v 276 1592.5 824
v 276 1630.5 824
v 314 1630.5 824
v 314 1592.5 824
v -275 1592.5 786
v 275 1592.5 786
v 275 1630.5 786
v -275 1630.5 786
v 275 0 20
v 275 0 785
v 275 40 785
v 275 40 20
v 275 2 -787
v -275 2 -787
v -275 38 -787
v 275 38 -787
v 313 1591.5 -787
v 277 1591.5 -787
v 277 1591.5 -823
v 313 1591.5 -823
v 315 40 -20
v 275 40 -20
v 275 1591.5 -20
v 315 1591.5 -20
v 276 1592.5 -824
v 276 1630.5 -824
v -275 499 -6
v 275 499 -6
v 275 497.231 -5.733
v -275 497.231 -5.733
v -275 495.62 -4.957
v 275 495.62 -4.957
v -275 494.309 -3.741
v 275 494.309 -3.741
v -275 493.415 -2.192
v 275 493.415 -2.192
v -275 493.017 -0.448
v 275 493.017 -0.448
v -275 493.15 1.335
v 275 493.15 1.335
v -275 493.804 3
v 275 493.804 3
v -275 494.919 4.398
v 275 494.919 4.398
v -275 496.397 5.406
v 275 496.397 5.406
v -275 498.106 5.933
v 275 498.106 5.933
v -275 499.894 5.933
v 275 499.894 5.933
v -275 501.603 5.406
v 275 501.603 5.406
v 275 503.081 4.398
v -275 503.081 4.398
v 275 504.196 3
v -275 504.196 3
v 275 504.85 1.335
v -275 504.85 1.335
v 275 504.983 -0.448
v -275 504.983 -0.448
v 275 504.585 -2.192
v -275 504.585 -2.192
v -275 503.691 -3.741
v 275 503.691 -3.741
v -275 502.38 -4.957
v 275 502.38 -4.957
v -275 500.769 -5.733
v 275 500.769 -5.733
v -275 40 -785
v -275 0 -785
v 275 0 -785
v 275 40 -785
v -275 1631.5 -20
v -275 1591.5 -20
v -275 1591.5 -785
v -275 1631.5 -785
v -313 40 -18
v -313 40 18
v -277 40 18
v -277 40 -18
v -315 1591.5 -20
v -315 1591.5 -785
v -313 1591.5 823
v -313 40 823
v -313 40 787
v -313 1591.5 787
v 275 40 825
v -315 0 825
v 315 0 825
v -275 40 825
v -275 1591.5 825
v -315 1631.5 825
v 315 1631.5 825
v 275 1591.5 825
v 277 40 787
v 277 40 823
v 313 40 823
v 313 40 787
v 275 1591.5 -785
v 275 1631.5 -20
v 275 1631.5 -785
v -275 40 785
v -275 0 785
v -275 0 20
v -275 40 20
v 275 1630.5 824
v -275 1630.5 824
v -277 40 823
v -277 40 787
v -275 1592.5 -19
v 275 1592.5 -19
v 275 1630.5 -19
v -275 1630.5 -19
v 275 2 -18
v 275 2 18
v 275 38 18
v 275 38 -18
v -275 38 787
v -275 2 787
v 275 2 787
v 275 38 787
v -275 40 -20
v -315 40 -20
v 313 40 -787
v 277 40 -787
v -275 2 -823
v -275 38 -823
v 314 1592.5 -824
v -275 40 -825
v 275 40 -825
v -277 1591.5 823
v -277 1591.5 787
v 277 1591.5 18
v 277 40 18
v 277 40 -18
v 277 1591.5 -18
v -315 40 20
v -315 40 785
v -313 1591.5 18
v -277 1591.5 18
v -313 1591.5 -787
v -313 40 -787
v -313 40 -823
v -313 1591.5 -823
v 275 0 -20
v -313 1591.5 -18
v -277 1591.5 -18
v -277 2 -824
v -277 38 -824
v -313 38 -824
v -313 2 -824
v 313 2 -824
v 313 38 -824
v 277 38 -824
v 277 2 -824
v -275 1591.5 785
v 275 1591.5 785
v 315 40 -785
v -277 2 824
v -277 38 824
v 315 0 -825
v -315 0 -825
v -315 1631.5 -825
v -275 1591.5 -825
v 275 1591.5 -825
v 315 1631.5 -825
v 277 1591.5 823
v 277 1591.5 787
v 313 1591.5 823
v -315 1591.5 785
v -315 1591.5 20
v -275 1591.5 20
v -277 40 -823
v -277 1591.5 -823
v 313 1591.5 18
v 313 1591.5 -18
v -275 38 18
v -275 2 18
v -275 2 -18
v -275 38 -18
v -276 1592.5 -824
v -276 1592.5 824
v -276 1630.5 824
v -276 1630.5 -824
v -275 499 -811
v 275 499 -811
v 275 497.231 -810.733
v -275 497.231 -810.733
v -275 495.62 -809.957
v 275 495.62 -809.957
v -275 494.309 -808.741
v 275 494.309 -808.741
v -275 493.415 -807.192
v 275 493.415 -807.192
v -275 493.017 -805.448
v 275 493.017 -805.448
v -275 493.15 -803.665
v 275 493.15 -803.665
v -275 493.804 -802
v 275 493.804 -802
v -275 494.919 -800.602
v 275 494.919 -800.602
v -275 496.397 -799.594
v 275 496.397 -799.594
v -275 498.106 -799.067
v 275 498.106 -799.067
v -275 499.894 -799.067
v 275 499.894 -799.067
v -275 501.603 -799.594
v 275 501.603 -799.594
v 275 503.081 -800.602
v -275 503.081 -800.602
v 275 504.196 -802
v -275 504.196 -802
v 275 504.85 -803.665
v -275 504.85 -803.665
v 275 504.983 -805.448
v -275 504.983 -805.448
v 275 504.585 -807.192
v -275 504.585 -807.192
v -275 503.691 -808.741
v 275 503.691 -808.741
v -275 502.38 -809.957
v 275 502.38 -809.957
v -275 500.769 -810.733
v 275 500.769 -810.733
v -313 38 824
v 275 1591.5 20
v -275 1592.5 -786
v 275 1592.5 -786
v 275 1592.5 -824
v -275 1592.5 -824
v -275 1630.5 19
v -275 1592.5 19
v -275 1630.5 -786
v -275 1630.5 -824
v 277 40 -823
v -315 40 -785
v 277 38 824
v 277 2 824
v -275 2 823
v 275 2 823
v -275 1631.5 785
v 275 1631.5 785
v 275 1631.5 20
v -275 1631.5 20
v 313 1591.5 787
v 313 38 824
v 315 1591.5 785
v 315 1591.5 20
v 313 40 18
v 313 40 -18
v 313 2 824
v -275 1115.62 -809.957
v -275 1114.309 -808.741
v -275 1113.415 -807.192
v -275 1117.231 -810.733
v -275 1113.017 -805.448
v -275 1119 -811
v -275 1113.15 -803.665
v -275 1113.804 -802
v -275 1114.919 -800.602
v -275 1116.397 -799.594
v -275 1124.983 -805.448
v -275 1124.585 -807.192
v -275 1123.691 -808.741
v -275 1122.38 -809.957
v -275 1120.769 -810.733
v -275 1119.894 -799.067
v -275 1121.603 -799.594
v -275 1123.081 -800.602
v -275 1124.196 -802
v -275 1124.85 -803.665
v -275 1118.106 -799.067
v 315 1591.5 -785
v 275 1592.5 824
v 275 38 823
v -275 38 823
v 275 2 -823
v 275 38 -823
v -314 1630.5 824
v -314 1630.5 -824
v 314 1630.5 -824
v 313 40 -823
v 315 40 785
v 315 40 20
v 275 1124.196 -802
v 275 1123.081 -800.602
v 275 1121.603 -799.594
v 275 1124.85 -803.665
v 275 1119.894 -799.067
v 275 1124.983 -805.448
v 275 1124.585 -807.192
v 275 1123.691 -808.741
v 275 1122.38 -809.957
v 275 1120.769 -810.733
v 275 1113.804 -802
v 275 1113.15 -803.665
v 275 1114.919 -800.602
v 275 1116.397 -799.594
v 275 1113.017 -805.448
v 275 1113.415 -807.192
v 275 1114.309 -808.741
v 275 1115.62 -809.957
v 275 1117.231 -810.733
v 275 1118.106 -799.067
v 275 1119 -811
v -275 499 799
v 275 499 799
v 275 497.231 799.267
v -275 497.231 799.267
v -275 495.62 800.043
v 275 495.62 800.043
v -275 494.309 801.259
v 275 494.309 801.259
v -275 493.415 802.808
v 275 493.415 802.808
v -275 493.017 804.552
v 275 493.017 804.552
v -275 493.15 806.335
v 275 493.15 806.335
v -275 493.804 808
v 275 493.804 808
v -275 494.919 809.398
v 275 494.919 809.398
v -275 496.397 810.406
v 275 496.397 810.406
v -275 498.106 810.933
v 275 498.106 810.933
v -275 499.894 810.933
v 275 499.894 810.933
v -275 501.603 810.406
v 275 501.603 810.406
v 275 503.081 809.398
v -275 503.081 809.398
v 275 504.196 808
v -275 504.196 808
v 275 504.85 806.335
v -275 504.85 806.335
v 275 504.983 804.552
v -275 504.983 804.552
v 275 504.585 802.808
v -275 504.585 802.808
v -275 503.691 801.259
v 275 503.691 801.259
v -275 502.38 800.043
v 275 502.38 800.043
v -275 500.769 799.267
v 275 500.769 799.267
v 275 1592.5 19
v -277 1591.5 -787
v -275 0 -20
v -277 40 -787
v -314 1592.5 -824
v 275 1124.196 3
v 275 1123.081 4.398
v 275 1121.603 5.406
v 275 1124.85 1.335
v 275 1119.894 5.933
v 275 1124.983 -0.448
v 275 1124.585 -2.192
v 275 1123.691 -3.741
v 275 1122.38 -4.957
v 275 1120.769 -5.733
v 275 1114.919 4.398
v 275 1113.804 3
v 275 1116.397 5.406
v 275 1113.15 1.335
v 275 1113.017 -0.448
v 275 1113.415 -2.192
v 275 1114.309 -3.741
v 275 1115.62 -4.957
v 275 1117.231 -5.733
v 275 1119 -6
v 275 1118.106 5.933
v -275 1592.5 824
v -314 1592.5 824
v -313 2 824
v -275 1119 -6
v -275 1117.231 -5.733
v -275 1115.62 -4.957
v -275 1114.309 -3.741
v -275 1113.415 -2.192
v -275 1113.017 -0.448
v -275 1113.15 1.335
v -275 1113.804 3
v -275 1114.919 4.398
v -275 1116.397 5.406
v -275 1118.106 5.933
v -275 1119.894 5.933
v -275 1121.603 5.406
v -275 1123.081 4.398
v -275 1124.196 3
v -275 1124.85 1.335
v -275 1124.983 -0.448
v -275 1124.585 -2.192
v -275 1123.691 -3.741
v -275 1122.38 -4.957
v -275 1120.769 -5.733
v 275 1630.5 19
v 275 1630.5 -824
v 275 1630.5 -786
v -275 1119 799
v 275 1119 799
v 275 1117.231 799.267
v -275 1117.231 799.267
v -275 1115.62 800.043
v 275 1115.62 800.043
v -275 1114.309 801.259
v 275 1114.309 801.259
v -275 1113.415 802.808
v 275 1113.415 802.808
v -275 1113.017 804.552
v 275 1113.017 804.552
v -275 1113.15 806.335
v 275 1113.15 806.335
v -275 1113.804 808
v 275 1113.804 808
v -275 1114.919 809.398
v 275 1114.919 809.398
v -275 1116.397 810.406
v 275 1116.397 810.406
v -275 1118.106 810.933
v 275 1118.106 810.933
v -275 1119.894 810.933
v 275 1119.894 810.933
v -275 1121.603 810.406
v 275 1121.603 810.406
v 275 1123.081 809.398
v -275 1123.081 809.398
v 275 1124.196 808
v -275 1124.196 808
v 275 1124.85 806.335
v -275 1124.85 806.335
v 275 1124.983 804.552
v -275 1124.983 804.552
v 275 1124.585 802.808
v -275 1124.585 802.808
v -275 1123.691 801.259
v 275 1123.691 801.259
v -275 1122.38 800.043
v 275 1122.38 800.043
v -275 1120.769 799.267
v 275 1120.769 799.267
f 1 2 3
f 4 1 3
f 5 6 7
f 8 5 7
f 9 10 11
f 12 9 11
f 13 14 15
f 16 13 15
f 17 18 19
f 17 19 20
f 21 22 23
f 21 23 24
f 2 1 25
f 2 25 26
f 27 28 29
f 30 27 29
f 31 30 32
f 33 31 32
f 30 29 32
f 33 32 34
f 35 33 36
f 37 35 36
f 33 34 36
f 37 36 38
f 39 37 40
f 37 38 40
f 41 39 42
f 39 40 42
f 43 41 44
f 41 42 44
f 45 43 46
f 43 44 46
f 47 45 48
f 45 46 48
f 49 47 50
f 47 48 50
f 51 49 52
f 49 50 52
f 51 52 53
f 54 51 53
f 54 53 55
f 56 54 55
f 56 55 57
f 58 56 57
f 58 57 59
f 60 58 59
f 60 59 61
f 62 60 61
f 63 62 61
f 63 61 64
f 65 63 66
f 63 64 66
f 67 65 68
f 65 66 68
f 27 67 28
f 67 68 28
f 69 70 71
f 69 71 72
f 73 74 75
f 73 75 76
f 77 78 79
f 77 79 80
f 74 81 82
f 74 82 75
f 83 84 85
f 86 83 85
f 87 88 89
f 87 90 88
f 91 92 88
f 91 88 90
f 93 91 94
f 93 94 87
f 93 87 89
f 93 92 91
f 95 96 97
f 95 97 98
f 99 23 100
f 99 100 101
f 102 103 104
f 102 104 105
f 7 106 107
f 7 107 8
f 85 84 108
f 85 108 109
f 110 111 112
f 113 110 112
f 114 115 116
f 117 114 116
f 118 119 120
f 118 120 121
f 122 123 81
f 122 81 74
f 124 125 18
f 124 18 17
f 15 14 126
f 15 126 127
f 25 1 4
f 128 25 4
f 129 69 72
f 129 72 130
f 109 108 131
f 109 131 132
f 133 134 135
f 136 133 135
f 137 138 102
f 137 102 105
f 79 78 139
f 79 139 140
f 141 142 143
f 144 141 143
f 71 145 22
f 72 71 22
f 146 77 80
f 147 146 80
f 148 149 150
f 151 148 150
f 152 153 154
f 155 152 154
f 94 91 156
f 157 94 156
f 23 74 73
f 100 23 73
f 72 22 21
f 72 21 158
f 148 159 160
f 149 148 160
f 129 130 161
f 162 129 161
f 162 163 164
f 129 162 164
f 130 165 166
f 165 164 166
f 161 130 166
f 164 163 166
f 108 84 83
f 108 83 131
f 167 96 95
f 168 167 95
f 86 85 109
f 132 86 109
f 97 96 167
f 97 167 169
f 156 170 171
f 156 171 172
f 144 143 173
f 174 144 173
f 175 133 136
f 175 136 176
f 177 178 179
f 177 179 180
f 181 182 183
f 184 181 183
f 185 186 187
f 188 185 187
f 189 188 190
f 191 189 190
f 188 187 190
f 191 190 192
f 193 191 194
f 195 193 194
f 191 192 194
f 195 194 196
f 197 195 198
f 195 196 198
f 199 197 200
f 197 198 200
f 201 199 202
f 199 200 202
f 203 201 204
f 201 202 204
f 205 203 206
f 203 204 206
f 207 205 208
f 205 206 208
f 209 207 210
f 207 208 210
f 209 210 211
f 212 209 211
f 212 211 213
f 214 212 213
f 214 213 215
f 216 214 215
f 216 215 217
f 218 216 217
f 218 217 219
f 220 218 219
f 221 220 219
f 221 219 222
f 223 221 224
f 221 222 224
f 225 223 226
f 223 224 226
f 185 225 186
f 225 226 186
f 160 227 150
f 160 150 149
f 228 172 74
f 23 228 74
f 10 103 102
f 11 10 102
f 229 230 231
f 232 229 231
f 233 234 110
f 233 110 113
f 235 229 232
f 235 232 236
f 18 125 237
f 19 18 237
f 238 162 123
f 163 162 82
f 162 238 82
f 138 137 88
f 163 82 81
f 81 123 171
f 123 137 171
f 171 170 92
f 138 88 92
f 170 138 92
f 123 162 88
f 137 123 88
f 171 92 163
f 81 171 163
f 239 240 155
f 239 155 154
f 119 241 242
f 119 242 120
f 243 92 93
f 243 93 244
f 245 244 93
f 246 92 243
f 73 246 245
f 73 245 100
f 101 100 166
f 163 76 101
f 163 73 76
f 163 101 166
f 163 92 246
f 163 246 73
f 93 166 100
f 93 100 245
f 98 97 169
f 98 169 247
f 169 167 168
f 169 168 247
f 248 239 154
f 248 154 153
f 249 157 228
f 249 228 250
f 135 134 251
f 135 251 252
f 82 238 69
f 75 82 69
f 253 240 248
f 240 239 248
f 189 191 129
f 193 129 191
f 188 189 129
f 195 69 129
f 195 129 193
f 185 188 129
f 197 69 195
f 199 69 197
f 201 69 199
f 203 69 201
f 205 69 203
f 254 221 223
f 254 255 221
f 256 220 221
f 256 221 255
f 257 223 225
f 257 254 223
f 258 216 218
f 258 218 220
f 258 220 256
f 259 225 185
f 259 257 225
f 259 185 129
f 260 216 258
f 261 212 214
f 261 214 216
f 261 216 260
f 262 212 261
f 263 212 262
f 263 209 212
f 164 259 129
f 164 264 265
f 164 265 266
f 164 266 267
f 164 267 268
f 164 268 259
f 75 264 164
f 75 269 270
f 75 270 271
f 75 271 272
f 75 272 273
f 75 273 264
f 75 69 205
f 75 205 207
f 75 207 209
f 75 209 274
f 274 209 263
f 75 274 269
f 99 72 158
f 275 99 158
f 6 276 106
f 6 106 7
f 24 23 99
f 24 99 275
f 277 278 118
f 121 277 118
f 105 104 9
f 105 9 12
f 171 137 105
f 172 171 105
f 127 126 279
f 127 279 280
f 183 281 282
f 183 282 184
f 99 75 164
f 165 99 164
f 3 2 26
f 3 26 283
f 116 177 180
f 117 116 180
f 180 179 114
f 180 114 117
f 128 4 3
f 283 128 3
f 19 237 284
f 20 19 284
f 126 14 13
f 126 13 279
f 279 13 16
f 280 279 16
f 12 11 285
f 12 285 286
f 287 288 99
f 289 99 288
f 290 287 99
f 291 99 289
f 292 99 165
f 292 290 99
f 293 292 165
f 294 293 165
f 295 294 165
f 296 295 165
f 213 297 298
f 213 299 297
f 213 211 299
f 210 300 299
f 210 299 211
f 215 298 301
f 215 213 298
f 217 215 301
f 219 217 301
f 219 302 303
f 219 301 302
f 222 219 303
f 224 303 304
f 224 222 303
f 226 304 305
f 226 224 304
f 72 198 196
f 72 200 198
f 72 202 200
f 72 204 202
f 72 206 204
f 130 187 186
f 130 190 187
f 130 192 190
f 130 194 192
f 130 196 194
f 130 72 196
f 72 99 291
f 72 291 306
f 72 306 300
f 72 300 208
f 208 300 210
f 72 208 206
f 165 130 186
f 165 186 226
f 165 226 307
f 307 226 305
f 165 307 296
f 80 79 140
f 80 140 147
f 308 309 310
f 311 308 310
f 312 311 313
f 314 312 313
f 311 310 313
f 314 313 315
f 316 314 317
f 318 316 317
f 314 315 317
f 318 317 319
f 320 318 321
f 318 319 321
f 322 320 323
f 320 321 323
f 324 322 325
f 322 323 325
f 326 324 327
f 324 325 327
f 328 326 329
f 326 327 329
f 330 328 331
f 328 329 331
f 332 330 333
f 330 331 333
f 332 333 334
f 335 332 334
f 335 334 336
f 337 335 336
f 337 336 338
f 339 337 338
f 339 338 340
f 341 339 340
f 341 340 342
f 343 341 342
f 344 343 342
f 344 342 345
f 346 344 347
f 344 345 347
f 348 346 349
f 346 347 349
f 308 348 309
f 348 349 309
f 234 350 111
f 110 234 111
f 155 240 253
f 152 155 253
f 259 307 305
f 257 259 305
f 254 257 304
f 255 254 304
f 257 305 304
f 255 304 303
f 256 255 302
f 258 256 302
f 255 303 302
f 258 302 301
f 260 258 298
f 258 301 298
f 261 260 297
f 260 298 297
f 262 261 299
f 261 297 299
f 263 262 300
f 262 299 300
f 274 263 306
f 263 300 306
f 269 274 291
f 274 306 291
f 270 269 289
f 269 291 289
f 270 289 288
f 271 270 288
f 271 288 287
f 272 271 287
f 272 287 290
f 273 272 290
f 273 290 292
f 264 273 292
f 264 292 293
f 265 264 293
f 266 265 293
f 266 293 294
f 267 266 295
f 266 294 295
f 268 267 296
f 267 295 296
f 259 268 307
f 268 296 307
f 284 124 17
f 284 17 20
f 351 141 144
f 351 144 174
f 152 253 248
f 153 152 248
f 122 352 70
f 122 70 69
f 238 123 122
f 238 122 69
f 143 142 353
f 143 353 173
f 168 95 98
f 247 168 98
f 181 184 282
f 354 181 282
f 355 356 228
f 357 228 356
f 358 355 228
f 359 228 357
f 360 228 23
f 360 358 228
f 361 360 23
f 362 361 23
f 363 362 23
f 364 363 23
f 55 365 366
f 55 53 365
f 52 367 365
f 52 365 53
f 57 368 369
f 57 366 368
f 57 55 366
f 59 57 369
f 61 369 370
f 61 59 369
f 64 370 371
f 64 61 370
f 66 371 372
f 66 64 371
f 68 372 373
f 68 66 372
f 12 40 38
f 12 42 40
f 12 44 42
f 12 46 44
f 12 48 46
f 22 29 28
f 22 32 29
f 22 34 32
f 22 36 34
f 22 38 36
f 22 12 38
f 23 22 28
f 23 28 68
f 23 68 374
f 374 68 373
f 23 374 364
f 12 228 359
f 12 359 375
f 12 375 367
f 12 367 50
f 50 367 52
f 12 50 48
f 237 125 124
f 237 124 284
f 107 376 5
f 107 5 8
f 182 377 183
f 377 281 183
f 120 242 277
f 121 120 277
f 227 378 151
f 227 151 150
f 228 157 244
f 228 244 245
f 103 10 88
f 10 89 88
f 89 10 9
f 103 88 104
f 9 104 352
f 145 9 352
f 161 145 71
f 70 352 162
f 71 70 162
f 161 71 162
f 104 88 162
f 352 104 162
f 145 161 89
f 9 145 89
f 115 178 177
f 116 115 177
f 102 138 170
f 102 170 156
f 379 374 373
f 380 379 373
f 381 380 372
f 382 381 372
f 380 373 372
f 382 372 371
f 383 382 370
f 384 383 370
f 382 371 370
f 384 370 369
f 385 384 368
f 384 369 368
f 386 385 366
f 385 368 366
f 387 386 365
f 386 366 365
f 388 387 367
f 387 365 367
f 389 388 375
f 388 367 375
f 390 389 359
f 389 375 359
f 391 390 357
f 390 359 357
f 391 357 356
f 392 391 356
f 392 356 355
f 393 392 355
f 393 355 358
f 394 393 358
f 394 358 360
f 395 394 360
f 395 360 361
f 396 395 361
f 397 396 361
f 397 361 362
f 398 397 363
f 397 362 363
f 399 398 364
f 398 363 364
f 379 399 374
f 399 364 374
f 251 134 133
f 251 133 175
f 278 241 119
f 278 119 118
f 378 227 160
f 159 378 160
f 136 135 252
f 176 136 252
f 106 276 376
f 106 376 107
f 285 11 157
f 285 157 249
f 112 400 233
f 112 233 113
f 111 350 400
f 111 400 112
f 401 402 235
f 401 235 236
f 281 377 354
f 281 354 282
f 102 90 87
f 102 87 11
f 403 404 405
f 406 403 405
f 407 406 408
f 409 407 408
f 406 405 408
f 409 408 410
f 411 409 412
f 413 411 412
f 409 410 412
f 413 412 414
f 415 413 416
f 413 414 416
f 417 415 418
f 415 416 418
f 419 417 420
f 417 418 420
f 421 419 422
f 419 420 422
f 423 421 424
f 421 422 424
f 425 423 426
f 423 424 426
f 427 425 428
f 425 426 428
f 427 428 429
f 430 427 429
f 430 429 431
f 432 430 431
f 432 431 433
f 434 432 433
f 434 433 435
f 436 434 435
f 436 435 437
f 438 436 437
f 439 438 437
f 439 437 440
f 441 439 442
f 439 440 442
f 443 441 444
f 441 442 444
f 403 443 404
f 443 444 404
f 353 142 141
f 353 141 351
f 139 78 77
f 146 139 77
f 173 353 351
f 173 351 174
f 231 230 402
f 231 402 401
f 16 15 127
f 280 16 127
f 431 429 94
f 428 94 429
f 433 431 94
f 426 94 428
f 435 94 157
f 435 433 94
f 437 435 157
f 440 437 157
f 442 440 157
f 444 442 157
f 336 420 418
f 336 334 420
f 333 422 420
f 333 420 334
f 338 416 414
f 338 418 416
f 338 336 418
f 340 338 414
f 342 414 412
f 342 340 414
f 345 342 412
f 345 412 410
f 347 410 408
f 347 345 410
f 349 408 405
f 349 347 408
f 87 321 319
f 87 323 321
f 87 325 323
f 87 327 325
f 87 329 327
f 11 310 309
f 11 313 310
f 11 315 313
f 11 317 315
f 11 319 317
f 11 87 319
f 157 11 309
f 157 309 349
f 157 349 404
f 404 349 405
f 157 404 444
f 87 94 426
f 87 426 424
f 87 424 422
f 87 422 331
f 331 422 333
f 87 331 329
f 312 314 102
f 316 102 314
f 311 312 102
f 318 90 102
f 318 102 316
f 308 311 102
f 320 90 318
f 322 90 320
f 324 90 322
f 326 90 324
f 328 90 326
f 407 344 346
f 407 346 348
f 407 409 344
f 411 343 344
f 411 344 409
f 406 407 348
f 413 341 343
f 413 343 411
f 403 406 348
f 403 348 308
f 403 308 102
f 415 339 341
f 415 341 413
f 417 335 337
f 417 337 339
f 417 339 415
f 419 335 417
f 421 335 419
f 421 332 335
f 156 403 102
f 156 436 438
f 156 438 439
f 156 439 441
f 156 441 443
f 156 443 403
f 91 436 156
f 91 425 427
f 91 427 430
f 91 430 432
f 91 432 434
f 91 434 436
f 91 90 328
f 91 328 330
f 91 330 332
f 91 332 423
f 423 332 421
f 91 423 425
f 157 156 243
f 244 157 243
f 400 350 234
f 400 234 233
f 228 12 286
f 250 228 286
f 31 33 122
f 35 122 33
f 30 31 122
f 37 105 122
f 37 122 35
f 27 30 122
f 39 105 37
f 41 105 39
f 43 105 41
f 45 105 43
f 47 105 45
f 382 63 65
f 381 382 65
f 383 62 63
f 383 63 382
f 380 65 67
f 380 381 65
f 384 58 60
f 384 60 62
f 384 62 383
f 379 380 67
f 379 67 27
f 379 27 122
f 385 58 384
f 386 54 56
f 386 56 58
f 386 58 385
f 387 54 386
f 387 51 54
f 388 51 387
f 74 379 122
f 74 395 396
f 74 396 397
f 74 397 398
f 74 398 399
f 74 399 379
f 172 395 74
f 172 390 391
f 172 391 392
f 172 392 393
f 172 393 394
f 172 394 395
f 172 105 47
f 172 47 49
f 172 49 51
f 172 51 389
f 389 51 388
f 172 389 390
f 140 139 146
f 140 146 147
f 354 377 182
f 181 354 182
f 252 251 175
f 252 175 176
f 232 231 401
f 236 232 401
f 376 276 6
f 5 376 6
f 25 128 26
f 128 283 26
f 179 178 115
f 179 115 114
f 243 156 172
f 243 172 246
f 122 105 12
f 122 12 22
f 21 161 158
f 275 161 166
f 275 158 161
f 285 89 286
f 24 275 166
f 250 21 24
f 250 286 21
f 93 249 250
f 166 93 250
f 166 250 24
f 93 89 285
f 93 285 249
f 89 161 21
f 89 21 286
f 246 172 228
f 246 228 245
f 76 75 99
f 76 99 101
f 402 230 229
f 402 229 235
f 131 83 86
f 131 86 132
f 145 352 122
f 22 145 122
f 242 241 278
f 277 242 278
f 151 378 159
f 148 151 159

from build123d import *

# Parameters (mm, degrees)
SKETCH1_W             = 40
SKETCH1_H             = 40
SKETCH1_W_2           = 36
SKETCH1_H_2           = 36
BOSS_EXTRUDE1_DEPTH   = 825
BOSS_EXTRUDE1_2_DEPTH = 825
SKETCH2_W             = 40
SKETCH2_H             = 40
SKETCH2_W_2           = 36
SKETCH2_H_2           = 36
BOSS_EXTRUDE2_DEPTH   = 550
SKETCH3_W             = 40
SKETCH3_H             = 40
SKETCH3_W_2           = 36
SKETCH3_H_2           = 36
BOSS_EXTRUDE5_DEPTH   = 1551.5
SKETCH5_W             = 40
SKETCH5_H             = 40
SKETCH5_W_2           = 38
SKETCH5_H_2           = 38
BOSS_EXTRUDE6_DEPTH   = 1650
SKETCH6_W             = 40
SKETCH6_H             = 40
SKETCH6_W_2           = 38
SKETCH6_H_2           = 38
BOSS_EXTRUDE7_DEPTH   = 550
SKETCH7_R             = 6
BOSS_EXTRUDE8_DEPTH   = 550
SKETCH8_W             = 40
SKETCH8_H             = 40
BOSS_EXTRUDE10_DEPTH  = 1
SKETCH9_W             = 40
SKETCH9_H             = 40
BOSS_EXTRUDE11_DEPTH  = 1


with BuildPart() as part:
    # Sketch1 → Boss-Extrude1 (new, symmetric)
    with BuildSketch(Plane.XY):
        with Locations((-295, 20)):
            Rectangle(SKETCH1_W, SKETCH1_H)
        with Locations((-295, 20)):
            Rectangle(SKETCH1_W_2, SKETCH1_H_2, mode=Mode.SUBTRACT)
    extrude(amount=BOSS_EXTRUDE1_DEPTH, both=True)



with BuildPart() as body_2:
    # Sketch1 → Boss-Extrude1 2 (new, symmetric)
    with BuildSketch(Plane.XY):
        with Locations((295, 20)):
            Rectangle(SKETCH1_W, SKETCH1_H)
        with Locations((295, 20)):
            Rectangle(SKETCH1_W_2, SKETCH1_H_2, mode=Mode.SUBTRACT)
    extrude(amount=BOSS_EXTRUDE1_2_DEPTH, both=True)


with BuildPart() as part_1:
    add(part.part)

    add(body_2.part)  # Boss-Extrude2 merges body 2
    # Sketch2 → Boss-Extrude2 (add)
    # profile 1 of 3: a face of its own
    with BuildSketch(Plane(origin=(-275, 0, 0), x_dir=(0, 0, -1), z_dir=(1, 0, 0))):
        with Locations((-805, 20)):
            Rectangle(SKETCH2_W, SKETCH2_H)
        with Locations((-805, 20)):
            Rectangle(SKETCH2_W_2, SKETCH2_H_2, mode=Mode.SUBTRACT)
    # profile 2 of 3: a face of its own
    with BuildSketch(Plane(origin=(-275, 0, 0), x_dir=(0, 0, -1), z_dir=(1, 0, 0))):
        with Locations((805, 20)):
            Rectangle(SKETCH2_W, SKETCH2_H)
        with Locations((805, 20)):
            Rectangle(SKETCH2_W_2, SKETCH2_H_2, mode=Mode.SUBTRACT)
    # profile 3 of 3: a face of its own
    with BuildSketch(Plane(origin=(-275, 0, 0), x_dir=(0, 0, -1), z_dir=(1, 0, 0))):
        with Locations((0, 20)):
            Rectangle(SKETCH2_W, SKETCH2_H)
        with Locations((0, 20)):
            Rectangle(SKETCH2_W_2, SKETCH2_H_2, mode=Mode.SUBTRACT)
    extrude(amount=BOSS_EXTRUDE2_DEPTH)

    # Sketch3 → Boss-Extrude5 (add)
    # profile 1 of 6: a face of its own
    with BuildSketch(Plane(origin=(0, 40, 0), x_dir=(1, 0, 0), z_dir=(0, 1, 0))):
        with Locations((-295, -805)):
            Rectangle(SKETCH3_W, SKETCH3_H)
        with Locations((-295, -805)):
            Rectangle(SKETCH3_W_2, SKETCH3_H_2, mode=Mode.SUBTRACT)
    # profile 2 of 6: a face of its own
    with BuildSketch(Plane(origin=(0, 40, 0), x_dir=(1, 0, 0), z_dir=(0, 1, 0))):
        with Locations((295, -805)):
            Rectangle(SKETCH3_W, SKETCH3_H)
        with Locations((295, -805)):
            Rectangle(SKETCH3_W_2, SKETCH3_H_2, mode=Mode.SUBTRACT)
    # profile 3 of 6: a face of its own
    with BuildSketch(Plane(origin=(0, 40, 0), x_dir=(1, 0, 0), z_dir=(0, 1, 0))):
        with Locations((295, 0)):
            Rectangle(SKETCH3_W, SKETCH3_H)
        with Locations((295, 0)):
            Rectangle(SKETCH3_W_2, SKETCH3_H_2, mode=Mode.SUBTRACT)
    # profile 4 of 6: a face of its own
    with BuildSketch(Plane(origin=(0, 40, 0), x_dir=(1, 0, 0), z_dir=(0, 1, 0))):
        with Locations((-295, 0)):
            Rectangle(SKETCH3_W, SKETCH3_H)
        with Locations((-295, 0)):
            Rectangle(SKETCH3_W_2, SKETCH3_H_2, mode=Mode.SUBTRACT)
    # profile 5 of 6: a face of its own
    with BuildSketch(Plane(origin=(0, 40, 0), x_dir=(1, 0, 0), z_dir=(0, 1, 0))):
        with Locations((-295, 805)):
            Rectangle(SKETCH3_W, SKETCH3_H)
        with Locations((-295, 805)):
            Rectangle(SKETCH3_W_2, SKETCH3_H_2, mode=Mode.SUBTRACT)
    # profile 6 of 6: a face of its own
    with BuildSketch(Plane(origin=(0, 40, 0), x_dir=(1, 0, 0), z_dir=(0, 1, 0))):
        with Locations((295, 805)):
            Rectangle(SKETCH3_W, SKETCH3_H)
        with Locations((295, 805)):
            Rectangle(SKETCH3_W_2, SKETCH3_H_2, mode=Mode.SUBTRACT)
    extrude(amount=BOSS_EXTRUDE5_DEPTH)

    # Sketch5 → Boss-Extrude6 (add)
    # profile 1 of 2: a face of its own
    with BuildSketch(Plane.XY.offset(825)):
        with Locations((-295, 1611.5)):
            Rectangle(SKETCH5_W, SKETCH5_H)
        with Locations((-295, 1611.5)):
            Rectangle(SKETCH5_W_2, SKETCH5_H_2, mode=Mode.SUBTRACT)
    # profile 2 of 2: a face of its own
    with BuildSketch(Plane.XY.offset(825)):
        with Locations((295, 1611.5)):
            Rectangle(SKETCH5_W, SKETCH5_H)
        with Locations((295, 1611.5)):
            Rectangle(SKETCH5_W_2, SKETCH5_H_2, mode=Mode.SUBTRACT)
    extrude(amount=-BOSS_EXTRUDE6_DEPTH)

    # Sketch6 → Boss-Extrude7 (add)
    # profile 1 of 3: a face of its own
    with BuildSketch(Plane(origin=(-275, 0, 0), x_dir=(0, 0, -1), z_dir=(1, 0, 0))):
        with Locations((0, 1611.5)):
            Rectangle(SKETCH6_W, SKETCH6_H)
        with Locations((0, 1611.5)):
            Rectangle(SKETCH6_W_2, SKETCH6_H_2, mode=Mode.SUBTRACT)
    # profile 2 of 3: a face of its own
    with BuildSketch(Plane(origin=(-275, 0, 0), x_dir=(0, 0, -1), z_dir=(1, 0, 0))):
        with Locations((-805, 1611.5)):
            Rectangle(SKETCH6_W, SKETCH6_H)
        with Locations((-805, 1611.5)):
            Rectangle(SKETCH6_W_2, SKETCH6_H_2, mode=Mode.SUBTRACT)
    # profile 3 of 3: a face of its own
    with BuildSketch(Plane(origin=(-275, 0, 0), x_dir=(0, 0, -1), z_dir=(1, 0, 0))):
        with Locations((805, 1611.5)):
            Rectangle(SKETCH6_W, SKETCH6_H)
        with Locations((805, 1611.5)):
            Rectangle(SKETCH6_W_2, SKETCH6_H_2, mode=Mode.SUBTRACT)
    extrude(amount=BOSS_EXTRUDE7_DEPTH)

    # Sketch7 → Boss-Extrude8 (add)
    with BuildSketch(Plane.ZY.offset(-275)):
        with Locations(Location((805, 1119, 0), (0, 0, 180))):
            Circle(SKETCH7_R)
        with Locations(Location((805, 499, 0), (0, 0, 180))):
            Circle(SKETCH7_R)
        with Locations(Location((0, 1119, 0), (0, 0, 180))):
            Circle(SKETCH7_R)
        with Locations(Location((0, 499, 0), (0, 0, 180))):
            Circle(SKETCH7_R)
        with Locations(Location((-805, 499, 0), (0, 0, 180))):
            Circle(SKETCH7_R)
        with Locations(Location((-805, 1119, 0), (0, 0, 180))):
            Circle(SKETCH7_R)
    extrude(amount=BOSS_EXTRUDE8_DEPTH)

    # Sketch8 → Boss-Extrude10 (add)
    with BuildSketch(Plane.XY.offset(825)):
        with Locations((-295, 1611.5)):
            Rectangle(SKETCH8_W, SKETCH8_H)
        with Locations((295, 1611.5)):
            Rectangle(SKETCH8_W, SKETCH8_H)
        with Locations((-295, 20)):
            Rectangle(SKETCH8_W, SKETCH8_H)
        with Locations((295, 20)):
            Rectangle(SKETCH8_W, SKETCH8_H)
    extrude(amount=-BOSS_EXTRUDE10_DEPTH)

    # Sketch9 → Boss-Extrude11 (add)
    with BuildSketch(Plane(origin=(0, 0, -825), x_dir=(-1, 0, 0), z_dir=(0, 0, -1))):
        with Locations((-295, 1611.5)):
            Rectangle(SKETCH9_W, SKETCH9_H)
        with Locations((295, 1611.5)):
            Rectangle(SKETCH9_W, SKETCH9_H)
        with Locations((295, 20)):
            Rectangle(SKETCH9_W, SKETCH9_H)
        with Locations((-295, 20)):
            Rectangle(SKETCH9_W, SKETCH9_H)
    extrude(amount=-BOSS_EXTRUDE11_DEPTH)


solid = part_1.part
